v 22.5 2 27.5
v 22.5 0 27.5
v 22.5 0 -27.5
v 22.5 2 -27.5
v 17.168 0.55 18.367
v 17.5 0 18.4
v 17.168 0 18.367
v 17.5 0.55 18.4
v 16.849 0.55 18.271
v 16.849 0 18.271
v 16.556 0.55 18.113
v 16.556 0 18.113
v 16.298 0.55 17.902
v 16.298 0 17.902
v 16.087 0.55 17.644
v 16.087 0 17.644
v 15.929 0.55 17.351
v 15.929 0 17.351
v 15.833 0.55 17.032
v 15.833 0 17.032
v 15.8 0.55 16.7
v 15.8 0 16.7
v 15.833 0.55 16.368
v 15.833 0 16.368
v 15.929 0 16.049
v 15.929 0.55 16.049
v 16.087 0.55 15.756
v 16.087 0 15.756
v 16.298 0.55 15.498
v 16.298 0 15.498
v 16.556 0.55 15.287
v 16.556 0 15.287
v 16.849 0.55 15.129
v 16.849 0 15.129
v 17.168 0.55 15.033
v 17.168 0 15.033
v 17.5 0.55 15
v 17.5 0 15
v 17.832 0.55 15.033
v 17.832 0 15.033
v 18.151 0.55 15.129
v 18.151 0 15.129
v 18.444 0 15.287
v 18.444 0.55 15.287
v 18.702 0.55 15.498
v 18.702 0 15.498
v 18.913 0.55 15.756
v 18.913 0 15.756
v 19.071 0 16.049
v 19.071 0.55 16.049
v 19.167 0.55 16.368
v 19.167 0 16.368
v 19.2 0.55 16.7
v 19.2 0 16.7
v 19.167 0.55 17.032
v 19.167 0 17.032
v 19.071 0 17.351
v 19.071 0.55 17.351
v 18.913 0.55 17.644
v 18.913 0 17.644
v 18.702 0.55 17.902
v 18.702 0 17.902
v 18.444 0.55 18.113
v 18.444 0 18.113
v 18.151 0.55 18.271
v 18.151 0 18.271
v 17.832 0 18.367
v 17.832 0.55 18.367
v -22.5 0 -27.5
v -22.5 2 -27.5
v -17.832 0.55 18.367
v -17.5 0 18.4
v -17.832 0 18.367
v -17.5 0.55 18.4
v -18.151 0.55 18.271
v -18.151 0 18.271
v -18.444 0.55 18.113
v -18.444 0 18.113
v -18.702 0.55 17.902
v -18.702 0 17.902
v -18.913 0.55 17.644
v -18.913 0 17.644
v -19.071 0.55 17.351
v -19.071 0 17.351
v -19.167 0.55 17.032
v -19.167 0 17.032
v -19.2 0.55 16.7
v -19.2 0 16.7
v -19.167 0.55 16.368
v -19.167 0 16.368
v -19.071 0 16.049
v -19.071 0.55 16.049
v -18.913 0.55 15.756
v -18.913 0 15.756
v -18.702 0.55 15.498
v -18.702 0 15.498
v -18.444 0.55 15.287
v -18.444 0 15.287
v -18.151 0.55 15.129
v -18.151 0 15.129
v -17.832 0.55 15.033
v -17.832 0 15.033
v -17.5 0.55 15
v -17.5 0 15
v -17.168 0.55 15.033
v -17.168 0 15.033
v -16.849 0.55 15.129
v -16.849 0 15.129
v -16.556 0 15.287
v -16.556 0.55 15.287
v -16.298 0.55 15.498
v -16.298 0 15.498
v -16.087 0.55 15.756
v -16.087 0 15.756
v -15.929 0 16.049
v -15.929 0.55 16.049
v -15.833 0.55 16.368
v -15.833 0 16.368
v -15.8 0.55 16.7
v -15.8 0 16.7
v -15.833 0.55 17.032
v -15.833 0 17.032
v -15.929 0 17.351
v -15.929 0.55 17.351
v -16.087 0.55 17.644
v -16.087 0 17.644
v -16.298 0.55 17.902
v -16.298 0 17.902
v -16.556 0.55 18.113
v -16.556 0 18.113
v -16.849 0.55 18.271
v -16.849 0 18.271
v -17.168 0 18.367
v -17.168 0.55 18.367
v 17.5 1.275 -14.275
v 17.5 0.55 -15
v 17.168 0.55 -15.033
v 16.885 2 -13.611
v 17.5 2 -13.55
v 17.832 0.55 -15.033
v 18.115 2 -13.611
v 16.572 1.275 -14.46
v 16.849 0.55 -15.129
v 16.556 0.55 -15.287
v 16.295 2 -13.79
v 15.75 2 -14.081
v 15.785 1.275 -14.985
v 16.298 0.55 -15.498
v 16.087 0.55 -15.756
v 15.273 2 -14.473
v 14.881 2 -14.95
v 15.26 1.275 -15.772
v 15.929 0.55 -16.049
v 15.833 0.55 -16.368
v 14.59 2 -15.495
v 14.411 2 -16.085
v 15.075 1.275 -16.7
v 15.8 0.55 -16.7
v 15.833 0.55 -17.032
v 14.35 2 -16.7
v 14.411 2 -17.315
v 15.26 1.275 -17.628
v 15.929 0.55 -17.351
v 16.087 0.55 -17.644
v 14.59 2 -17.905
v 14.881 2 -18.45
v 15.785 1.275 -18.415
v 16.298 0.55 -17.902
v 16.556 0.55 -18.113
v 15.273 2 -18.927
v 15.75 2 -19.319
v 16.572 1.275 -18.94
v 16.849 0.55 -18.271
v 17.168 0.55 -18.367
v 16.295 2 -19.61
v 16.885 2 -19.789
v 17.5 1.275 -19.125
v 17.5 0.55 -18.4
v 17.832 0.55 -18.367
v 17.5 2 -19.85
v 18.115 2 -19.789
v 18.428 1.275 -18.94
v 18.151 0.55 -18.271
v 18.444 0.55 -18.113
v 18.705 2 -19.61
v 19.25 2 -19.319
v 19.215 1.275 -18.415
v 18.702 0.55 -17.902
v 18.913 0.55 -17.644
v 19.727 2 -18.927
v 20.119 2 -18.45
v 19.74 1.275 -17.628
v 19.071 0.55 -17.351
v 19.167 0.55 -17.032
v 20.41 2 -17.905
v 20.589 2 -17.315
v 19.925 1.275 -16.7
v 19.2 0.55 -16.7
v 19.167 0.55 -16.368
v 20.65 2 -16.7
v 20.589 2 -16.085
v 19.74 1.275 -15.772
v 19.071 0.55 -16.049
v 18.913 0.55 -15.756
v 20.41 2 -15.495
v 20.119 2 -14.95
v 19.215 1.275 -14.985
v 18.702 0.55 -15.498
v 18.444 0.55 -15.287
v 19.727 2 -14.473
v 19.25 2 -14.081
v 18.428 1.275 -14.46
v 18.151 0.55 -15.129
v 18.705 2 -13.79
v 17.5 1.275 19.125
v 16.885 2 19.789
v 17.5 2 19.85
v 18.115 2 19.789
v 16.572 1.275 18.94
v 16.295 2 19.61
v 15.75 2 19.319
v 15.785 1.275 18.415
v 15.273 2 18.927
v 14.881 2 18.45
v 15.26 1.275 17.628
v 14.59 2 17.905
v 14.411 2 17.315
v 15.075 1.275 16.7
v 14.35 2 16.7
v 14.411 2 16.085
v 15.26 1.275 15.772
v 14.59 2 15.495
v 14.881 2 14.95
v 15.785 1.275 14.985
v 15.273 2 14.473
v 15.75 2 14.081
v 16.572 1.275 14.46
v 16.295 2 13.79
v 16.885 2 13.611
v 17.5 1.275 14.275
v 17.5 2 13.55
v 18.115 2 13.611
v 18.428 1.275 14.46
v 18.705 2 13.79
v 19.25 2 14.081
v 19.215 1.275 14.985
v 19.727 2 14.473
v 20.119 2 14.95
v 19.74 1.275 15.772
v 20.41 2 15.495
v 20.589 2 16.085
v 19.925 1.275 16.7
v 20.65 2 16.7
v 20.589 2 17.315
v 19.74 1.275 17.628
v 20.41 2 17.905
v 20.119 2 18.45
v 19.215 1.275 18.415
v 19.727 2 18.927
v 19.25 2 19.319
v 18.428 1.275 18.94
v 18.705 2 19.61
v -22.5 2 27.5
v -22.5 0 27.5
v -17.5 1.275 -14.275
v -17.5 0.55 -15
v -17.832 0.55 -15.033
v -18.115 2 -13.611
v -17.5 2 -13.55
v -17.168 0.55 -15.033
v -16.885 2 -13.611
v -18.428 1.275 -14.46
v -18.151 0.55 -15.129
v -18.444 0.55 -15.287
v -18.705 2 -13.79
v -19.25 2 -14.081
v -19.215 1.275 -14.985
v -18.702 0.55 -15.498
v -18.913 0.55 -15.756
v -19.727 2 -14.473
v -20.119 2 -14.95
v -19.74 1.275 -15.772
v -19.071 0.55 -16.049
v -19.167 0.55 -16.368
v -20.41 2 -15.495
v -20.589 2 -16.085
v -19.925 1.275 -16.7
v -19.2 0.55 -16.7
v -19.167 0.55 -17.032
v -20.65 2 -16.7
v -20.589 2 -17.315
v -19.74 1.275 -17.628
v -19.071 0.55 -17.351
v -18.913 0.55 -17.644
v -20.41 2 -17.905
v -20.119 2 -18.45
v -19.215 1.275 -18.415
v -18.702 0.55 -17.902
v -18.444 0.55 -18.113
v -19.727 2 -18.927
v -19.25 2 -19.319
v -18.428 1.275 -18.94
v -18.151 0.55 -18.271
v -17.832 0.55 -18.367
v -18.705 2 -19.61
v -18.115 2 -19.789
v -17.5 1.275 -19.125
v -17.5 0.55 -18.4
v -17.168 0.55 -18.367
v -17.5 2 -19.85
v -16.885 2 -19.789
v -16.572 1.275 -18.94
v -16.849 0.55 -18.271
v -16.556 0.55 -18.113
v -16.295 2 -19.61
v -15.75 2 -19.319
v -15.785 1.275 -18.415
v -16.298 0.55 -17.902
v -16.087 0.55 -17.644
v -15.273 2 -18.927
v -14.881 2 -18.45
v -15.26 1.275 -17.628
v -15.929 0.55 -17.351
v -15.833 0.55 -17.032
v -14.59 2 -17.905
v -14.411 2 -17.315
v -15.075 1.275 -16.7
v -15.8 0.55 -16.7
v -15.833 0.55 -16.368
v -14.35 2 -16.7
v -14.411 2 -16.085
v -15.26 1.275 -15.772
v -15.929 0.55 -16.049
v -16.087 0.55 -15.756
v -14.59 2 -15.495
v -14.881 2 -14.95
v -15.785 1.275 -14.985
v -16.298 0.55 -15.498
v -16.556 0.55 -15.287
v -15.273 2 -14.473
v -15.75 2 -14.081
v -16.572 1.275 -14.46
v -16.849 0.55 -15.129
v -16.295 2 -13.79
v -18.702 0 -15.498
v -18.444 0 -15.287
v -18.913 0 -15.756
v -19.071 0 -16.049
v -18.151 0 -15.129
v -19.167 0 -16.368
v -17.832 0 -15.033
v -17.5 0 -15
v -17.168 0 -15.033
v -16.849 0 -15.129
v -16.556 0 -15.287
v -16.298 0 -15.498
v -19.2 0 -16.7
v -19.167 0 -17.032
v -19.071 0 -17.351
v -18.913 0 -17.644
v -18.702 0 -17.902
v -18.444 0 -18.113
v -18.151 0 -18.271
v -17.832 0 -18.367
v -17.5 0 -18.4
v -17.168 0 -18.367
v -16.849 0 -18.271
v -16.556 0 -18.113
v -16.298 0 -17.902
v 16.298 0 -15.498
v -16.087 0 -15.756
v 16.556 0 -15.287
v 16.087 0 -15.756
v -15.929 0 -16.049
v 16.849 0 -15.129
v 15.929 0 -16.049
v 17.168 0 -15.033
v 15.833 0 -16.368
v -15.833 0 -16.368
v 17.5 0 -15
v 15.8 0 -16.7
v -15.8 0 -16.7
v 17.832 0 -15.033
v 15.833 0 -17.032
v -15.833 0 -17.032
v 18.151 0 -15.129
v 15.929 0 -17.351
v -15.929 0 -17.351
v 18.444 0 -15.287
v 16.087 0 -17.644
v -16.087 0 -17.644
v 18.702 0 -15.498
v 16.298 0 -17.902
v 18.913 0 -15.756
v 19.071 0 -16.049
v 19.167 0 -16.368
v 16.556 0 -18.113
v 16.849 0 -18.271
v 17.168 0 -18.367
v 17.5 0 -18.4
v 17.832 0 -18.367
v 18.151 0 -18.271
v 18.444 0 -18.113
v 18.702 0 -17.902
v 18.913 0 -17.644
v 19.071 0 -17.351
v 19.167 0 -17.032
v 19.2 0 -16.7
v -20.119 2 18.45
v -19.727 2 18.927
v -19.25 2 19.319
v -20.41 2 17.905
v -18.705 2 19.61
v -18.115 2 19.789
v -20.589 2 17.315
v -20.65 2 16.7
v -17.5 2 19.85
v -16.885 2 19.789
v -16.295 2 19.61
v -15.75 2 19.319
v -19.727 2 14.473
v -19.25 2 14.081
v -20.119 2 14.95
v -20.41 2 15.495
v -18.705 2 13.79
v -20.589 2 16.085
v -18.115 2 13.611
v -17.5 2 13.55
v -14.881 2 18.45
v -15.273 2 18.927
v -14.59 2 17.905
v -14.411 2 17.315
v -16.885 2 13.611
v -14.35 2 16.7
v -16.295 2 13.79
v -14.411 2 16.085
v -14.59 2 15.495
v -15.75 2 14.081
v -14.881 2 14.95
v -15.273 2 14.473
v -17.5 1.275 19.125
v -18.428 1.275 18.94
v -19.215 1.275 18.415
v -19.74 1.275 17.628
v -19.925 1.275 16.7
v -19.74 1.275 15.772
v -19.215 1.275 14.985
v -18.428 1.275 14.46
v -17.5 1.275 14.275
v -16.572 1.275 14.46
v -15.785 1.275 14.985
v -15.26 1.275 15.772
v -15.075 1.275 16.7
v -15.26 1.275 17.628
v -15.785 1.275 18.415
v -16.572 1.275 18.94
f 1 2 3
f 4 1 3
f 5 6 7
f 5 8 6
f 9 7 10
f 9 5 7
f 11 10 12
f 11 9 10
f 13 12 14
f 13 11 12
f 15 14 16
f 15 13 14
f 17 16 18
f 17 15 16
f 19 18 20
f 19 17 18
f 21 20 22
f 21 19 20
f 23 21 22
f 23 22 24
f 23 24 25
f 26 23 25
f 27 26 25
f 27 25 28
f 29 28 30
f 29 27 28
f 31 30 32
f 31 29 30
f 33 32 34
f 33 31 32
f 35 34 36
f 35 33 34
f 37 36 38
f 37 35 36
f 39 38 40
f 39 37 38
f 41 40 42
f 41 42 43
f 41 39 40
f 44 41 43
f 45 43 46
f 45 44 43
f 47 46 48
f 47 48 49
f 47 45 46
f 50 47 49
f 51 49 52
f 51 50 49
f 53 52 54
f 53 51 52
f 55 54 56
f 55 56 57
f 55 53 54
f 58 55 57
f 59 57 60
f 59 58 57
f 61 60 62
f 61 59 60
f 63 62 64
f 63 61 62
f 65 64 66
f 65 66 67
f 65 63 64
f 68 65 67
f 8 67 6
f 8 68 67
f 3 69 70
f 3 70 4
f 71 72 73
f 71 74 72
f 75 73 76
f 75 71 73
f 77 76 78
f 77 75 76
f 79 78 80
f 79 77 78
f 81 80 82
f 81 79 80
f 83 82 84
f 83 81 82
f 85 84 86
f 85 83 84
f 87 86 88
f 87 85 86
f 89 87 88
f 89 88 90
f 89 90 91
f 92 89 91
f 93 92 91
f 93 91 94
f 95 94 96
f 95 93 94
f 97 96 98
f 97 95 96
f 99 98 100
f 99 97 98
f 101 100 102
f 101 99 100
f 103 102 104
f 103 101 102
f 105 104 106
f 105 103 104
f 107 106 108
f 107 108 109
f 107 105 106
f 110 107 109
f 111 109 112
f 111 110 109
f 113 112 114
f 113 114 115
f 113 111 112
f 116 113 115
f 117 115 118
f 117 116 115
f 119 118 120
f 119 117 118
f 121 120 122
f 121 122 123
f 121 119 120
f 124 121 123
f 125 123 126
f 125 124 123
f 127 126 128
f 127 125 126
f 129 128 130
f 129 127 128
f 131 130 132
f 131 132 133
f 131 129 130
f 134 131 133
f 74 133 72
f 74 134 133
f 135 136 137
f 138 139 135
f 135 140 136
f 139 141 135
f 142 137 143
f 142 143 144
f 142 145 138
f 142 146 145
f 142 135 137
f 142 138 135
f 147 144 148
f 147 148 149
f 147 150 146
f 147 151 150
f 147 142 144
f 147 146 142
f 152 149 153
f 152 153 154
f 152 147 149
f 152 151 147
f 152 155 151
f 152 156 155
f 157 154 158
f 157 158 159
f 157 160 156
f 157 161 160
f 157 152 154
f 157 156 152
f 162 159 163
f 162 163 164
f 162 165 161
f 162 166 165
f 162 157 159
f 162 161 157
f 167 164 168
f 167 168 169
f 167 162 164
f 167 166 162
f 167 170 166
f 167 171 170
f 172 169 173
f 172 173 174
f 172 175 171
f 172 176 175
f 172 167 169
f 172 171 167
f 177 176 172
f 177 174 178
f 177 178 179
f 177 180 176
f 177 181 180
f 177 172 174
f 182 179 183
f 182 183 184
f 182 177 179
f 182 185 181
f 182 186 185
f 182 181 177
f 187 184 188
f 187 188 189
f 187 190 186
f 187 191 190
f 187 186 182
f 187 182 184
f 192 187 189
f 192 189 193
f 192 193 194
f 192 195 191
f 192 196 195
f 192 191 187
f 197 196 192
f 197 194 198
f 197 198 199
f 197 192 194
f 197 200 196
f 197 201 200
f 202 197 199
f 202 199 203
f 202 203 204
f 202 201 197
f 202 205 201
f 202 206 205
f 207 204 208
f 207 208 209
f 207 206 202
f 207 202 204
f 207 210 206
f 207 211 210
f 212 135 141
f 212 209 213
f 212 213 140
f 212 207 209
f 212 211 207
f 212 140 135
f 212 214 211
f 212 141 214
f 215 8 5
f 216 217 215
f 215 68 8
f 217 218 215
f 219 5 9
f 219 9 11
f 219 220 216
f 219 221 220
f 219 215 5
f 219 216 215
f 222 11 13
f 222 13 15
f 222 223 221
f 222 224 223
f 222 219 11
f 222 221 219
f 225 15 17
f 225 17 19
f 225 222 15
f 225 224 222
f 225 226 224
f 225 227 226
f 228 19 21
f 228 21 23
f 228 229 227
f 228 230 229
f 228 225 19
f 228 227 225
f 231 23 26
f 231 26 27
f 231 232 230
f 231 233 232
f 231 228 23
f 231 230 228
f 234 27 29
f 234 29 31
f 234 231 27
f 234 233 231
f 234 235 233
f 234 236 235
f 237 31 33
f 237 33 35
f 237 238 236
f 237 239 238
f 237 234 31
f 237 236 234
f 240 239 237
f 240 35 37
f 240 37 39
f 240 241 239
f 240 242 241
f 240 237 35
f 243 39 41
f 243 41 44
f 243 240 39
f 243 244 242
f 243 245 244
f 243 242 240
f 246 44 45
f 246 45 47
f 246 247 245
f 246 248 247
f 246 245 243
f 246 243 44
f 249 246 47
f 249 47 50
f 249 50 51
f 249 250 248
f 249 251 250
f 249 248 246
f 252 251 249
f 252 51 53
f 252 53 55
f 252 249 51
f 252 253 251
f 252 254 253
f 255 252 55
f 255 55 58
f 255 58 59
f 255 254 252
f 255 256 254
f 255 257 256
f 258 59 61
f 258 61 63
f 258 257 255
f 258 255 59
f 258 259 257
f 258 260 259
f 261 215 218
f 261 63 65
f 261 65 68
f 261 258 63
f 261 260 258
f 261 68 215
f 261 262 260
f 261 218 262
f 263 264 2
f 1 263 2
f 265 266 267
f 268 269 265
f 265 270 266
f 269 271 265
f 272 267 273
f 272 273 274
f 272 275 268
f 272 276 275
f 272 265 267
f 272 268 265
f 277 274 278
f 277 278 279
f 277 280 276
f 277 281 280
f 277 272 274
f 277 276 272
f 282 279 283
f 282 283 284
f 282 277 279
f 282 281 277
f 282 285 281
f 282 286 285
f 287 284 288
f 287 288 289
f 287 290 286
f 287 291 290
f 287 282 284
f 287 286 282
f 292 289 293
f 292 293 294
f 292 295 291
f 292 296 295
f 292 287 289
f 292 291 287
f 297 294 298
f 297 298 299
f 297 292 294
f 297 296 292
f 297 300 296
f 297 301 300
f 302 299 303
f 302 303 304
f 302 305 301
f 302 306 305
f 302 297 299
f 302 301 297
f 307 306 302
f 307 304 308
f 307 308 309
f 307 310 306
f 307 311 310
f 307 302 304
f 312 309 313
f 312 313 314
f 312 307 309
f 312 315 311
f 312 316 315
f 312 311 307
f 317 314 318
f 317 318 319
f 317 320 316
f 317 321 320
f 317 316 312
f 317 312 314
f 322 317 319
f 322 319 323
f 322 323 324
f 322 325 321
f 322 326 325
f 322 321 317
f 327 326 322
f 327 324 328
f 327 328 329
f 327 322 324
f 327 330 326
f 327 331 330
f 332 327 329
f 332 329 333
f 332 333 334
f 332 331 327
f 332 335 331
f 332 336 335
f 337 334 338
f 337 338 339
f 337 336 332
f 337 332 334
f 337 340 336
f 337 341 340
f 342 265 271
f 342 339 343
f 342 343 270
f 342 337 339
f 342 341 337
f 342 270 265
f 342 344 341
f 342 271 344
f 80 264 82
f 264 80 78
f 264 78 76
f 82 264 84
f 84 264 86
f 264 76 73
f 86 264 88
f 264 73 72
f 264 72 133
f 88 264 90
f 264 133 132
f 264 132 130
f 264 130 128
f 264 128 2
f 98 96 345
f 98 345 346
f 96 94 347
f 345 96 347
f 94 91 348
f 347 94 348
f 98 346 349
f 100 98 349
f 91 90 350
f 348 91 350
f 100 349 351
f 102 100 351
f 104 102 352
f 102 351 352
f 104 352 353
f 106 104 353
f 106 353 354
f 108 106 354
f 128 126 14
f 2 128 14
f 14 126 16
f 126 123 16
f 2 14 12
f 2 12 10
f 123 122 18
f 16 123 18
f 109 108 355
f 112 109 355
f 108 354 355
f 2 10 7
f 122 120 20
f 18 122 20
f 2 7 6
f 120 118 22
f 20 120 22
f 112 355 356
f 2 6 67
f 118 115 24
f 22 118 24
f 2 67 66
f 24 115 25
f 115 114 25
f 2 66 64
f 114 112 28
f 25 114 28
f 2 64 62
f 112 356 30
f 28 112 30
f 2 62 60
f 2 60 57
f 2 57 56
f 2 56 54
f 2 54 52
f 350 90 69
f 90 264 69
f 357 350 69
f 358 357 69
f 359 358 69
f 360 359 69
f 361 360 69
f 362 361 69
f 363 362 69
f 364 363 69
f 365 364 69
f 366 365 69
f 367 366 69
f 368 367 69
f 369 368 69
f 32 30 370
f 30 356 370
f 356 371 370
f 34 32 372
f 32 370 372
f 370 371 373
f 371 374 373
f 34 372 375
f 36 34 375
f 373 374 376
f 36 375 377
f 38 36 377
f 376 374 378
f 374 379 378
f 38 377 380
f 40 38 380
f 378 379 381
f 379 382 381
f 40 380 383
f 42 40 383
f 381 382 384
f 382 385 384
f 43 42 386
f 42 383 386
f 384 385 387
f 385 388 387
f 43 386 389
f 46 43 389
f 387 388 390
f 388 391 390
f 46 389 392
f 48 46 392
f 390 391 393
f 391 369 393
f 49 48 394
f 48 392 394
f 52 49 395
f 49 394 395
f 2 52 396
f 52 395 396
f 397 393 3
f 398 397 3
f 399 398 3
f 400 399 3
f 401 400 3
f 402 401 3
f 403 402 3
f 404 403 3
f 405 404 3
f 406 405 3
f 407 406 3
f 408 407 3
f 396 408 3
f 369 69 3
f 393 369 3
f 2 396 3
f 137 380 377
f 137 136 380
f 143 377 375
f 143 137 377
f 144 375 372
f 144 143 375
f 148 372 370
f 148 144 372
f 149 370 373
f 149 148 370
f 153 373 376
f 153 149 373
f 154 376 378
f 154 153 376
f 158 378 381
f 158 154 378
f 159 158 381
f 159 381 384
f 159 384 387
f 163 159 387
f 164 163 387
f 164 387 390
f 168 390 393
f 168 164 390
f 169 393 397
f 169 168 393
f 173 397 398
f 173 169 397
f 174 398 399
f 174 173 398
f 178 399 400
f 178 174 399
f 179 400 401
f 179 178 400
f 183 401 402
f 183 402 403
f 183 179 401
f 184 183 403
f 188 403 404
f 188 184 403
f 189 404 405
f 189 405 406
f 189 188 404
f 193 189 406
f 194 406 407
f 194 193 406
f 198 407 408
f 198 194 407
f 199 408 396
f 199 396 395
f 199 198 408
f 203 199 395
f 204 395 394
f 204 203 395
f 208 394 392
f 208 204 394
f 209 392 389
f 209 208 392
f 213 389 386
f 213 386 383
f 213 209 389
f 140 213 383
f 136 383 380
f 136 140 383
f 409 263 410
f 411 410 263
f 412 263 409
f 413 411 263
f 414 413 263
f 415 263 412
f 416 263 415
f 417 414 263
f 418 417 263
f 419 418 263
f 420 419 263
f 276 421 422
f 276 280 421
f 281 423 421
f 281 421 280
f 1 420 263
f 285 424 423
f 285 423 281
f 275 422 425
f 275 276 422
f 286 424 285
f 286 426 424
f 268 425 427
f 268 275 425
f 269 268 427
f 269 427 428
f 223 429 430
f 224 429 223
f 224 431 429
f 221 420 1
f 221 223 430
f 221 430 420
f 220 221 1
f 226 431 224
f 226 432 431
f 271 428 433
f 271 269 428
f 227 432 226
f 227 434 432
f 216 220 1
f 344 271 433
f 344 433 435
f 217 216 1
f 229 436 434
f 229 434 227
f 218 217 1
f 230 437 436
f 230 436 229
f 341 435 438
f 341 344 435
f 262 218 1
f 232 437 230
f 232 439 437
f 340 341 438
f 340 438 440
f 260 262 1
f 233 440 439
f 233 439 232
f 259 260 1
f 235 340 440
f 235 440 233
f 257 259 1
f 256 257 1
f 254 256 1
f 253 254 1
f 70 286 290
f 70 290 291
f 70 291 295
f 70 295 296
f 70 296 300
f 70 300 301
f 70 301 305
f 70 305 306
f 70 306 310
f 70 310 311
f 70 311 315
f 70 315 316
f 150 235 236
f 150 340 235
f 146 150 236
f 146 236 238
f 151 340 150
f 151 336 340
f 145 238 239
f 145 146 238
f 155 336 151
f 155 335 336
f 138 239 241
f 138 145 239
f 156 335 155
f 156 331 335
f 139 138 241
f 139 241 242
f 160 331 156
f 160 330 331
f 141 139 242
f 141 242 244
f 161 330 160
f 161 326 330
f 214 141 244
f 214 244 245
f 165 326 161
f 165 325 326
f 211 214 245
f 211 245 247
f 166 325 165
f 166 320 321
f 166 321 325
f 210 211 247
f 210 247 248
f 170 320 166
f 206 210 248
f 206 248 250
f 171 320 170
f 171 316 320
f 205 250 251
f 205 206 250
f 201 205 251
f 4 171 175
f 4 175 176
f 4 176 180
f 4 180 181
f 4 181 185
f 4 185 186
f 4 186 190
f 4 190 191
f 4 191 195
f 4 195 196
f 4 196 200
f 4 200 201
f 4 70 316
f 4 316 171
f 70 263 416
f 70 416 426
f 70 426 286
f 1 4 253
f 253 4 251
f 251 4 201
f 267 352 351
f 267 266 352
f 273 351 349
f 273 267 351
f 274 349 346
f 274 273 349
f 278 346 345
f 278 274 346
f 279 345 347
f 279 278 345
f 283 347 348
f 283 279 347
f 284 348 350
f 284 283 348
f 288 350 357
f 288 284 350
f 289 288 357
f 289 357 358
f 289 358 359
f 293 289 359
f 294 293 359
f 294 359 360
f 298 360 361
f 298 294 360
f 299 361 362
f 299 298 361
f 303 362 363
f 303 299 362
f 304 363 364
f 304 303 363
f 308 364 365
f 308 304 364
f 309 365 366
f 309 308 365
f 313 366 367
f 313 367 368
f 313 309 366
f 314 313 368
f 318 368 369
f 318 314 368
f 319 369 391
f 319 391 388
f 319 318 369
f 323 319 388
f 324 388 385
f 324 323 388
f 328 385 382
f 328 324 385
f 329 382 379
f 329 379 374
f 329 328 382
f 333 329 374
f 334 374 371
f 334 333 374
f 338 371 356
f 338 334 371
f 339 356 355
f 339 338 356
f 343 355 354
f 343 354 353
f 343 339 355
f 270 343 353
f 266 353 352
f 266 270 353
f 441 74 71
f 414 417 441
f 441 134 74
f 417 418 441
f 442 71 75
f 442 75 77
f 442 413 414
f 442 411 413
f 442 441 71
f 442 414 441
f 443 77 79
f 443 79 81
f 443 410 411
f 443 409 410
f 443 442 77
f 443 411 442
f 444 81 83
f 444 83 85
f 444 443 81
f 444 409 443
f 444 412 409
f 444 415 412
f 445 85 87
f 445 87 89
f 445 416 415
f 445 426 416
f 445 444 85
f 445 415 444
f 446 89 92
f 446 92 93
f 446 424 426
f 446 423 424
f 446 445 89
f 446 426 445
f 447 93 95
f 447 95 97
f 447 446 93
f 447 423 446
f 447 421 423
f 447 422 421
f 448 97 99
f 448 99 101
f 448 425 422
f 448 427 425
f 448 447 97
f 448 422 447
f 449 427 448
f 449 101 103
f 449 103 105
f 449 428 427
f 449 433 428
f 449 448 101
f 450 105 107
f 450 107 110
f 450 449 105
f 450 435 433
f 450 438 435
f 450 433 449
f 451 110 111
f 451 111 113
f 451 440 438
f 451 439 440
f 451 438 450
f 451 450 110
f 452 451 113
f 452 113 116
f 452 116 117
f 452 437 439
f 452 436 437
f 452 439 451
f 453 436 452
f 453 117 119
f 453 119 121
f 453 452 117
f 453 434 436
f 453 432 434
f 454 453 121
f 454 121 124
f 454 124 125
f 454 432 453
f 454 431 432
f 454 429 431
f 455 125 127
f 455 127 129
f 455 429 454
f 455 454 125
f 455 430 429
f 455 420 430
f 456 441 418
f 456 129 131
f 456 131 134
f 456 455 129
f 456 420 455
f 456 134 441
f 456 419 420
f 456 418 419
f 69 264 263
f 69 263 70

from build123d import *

# Parameters (mm, degrees)
SKETCH1_W                                      = 45
SKETCH1_H                                      = 55
SKETCH1_W_2                                    = 5
SKETCH1_H_2                                    = 2
BOSS_EXTRUDE1_DEPTH                            = 2
CSK_FOR_M3_FLAT_HEAD_MACHINE_SCREW1_AT_2_COUNT = 2
CSK_FOR_M3_FLAT_HEAD_MACHINE_SCREW1_AT_2_PITCH = 35
CSK_FOR_M3_FLAT_HEAD_MACHINE_SCREW1_AT_3_COUNT = 2
CSK_FOR_M3_FLAT_HEAD_MACHINE_SCREW1_AT_3_PITCH = 48.379334431
CSK_FOR_M3_FLAT_HEAD_MACHINE_SCREW1_AT_4_COUNT = 2
CSK_FOR_M3_FLAT_HEAD_MACHINE_SCREW1_AT_4_PITCH = 33.4


with BuildPart() as part:
    # Sketch1 → Boss-Extrude1 (new body)
    # profile 1 of 3: a face of its own
    with BuildSketch(Plane(origin=(0, 0, 0), x_dir=(1, 0, 0), z_dir=(0, 1, 0))):
        Rectangle(SKETCH1_W, SKETCH1_H)
        with Locations((0, 26.25)):
            Rectangle(SKETCH1_W_2, SKETCH1_H_2, mode=Mode.SUBTRACT)
        with Locations((0, -26.25)):
            Rectangle(SKETCH1_W_2, SKETCH1_H_2, mode=Mode.SUBTRACT)
    # profile 2 of 3: a face of its own
    with BuildSketch(Plane(origin=(0, 0, 0), x_dir=(1, 0, 0), z_dir=(0, 1, 0))):
        with Locations((0, 26.25)):
            Rectangle(SKETCH1_W_2, SKETCH1_H_2)
    # profile 3 of 3: a face of its own
    with BuildSketch(Plane(origin=(0, 0, 0), x_dir=(1, 0, 0), z_dir=(0, 1, 0))):
        with Locations((0, -26.25)):
            Rectangle(SKETCH1_W_2, SKETCH1_H_2)
    extrude(amount=BOSS_EXTRUDE1_DEPTH)

    # Sketch5 → CSK for M3 Flat Head Machine Screw1 (revolve, cut)
    with BuildSketch(Plane(origin=(-17.5, 2, -16.7), x_dir=(0, 0, 1), z_dir=(1, 0, 0))):
        Polygon((0, 0), (0, 2), (1.7, 2), (1.7, 1.45), (3.15, 0), align=None)
    csk_for_m3_flat_head_machine_screw1 = revolve(axis=Axis((-17.5, 8.35, -16.7), (0, -1, 0)), mode=Mode.SUBTRACT)

    # CSK for M3 Flat Head Machine Screw1 at 2: CSK for M3 Flat Head Machine Screw1 ×2
    with Locations(*[(i * CSK_FOR_M3_FLAT_HEAD_MACHINE_SCREW1_AT_2_PITCH, 0, 0) for i in range(1, CSK_FOR_M3_FLAT_HEAD_MACHINE_SCREW1_AT_2_COUNT)]):
        add(csk_for_m3_flat_head_machine_screw1, mode=Mode.SUBTRACT)

    # CSK for M3 Flat Head Machine Screw1 at 3: CSK for M3 Flat Head Machine Screw1 ×2
    with Locations(*[Vector(0.7234493903552432, 0, 0.6903774182247178) * (i * CSK_FOR_M3_FLAT_HEAD_MACHINE_SCREW1_AT_3_PITCH) for i in range(1, CSK_FOR_M3_FLAT_HEAD_MACHINE_SCREW1_AT_3_COUNT)]):
        add(csk_for_m3_flat_head_machine_screw1, mode=Mode.SUBTRACT)

    # CSK for M3 Flat Head Machine Screw1 at 4: CSK for M3 Flat Head Machine Screw1 ×2
    with Locations(*[(0, 0, i * CSK_FOR_M3_FLAT_HEAD_MACHINE_SCREW1_AT_4_PITCH) for i in range(1, CSK_FOR_M3_FLAT_HEAD_MACHINE_SCREW1_AT_4_COUNT)]):
        add(csk_for_m3_flat_head_machine_screw1, mode=Mode.SUBTRACT)


solid = part.part
